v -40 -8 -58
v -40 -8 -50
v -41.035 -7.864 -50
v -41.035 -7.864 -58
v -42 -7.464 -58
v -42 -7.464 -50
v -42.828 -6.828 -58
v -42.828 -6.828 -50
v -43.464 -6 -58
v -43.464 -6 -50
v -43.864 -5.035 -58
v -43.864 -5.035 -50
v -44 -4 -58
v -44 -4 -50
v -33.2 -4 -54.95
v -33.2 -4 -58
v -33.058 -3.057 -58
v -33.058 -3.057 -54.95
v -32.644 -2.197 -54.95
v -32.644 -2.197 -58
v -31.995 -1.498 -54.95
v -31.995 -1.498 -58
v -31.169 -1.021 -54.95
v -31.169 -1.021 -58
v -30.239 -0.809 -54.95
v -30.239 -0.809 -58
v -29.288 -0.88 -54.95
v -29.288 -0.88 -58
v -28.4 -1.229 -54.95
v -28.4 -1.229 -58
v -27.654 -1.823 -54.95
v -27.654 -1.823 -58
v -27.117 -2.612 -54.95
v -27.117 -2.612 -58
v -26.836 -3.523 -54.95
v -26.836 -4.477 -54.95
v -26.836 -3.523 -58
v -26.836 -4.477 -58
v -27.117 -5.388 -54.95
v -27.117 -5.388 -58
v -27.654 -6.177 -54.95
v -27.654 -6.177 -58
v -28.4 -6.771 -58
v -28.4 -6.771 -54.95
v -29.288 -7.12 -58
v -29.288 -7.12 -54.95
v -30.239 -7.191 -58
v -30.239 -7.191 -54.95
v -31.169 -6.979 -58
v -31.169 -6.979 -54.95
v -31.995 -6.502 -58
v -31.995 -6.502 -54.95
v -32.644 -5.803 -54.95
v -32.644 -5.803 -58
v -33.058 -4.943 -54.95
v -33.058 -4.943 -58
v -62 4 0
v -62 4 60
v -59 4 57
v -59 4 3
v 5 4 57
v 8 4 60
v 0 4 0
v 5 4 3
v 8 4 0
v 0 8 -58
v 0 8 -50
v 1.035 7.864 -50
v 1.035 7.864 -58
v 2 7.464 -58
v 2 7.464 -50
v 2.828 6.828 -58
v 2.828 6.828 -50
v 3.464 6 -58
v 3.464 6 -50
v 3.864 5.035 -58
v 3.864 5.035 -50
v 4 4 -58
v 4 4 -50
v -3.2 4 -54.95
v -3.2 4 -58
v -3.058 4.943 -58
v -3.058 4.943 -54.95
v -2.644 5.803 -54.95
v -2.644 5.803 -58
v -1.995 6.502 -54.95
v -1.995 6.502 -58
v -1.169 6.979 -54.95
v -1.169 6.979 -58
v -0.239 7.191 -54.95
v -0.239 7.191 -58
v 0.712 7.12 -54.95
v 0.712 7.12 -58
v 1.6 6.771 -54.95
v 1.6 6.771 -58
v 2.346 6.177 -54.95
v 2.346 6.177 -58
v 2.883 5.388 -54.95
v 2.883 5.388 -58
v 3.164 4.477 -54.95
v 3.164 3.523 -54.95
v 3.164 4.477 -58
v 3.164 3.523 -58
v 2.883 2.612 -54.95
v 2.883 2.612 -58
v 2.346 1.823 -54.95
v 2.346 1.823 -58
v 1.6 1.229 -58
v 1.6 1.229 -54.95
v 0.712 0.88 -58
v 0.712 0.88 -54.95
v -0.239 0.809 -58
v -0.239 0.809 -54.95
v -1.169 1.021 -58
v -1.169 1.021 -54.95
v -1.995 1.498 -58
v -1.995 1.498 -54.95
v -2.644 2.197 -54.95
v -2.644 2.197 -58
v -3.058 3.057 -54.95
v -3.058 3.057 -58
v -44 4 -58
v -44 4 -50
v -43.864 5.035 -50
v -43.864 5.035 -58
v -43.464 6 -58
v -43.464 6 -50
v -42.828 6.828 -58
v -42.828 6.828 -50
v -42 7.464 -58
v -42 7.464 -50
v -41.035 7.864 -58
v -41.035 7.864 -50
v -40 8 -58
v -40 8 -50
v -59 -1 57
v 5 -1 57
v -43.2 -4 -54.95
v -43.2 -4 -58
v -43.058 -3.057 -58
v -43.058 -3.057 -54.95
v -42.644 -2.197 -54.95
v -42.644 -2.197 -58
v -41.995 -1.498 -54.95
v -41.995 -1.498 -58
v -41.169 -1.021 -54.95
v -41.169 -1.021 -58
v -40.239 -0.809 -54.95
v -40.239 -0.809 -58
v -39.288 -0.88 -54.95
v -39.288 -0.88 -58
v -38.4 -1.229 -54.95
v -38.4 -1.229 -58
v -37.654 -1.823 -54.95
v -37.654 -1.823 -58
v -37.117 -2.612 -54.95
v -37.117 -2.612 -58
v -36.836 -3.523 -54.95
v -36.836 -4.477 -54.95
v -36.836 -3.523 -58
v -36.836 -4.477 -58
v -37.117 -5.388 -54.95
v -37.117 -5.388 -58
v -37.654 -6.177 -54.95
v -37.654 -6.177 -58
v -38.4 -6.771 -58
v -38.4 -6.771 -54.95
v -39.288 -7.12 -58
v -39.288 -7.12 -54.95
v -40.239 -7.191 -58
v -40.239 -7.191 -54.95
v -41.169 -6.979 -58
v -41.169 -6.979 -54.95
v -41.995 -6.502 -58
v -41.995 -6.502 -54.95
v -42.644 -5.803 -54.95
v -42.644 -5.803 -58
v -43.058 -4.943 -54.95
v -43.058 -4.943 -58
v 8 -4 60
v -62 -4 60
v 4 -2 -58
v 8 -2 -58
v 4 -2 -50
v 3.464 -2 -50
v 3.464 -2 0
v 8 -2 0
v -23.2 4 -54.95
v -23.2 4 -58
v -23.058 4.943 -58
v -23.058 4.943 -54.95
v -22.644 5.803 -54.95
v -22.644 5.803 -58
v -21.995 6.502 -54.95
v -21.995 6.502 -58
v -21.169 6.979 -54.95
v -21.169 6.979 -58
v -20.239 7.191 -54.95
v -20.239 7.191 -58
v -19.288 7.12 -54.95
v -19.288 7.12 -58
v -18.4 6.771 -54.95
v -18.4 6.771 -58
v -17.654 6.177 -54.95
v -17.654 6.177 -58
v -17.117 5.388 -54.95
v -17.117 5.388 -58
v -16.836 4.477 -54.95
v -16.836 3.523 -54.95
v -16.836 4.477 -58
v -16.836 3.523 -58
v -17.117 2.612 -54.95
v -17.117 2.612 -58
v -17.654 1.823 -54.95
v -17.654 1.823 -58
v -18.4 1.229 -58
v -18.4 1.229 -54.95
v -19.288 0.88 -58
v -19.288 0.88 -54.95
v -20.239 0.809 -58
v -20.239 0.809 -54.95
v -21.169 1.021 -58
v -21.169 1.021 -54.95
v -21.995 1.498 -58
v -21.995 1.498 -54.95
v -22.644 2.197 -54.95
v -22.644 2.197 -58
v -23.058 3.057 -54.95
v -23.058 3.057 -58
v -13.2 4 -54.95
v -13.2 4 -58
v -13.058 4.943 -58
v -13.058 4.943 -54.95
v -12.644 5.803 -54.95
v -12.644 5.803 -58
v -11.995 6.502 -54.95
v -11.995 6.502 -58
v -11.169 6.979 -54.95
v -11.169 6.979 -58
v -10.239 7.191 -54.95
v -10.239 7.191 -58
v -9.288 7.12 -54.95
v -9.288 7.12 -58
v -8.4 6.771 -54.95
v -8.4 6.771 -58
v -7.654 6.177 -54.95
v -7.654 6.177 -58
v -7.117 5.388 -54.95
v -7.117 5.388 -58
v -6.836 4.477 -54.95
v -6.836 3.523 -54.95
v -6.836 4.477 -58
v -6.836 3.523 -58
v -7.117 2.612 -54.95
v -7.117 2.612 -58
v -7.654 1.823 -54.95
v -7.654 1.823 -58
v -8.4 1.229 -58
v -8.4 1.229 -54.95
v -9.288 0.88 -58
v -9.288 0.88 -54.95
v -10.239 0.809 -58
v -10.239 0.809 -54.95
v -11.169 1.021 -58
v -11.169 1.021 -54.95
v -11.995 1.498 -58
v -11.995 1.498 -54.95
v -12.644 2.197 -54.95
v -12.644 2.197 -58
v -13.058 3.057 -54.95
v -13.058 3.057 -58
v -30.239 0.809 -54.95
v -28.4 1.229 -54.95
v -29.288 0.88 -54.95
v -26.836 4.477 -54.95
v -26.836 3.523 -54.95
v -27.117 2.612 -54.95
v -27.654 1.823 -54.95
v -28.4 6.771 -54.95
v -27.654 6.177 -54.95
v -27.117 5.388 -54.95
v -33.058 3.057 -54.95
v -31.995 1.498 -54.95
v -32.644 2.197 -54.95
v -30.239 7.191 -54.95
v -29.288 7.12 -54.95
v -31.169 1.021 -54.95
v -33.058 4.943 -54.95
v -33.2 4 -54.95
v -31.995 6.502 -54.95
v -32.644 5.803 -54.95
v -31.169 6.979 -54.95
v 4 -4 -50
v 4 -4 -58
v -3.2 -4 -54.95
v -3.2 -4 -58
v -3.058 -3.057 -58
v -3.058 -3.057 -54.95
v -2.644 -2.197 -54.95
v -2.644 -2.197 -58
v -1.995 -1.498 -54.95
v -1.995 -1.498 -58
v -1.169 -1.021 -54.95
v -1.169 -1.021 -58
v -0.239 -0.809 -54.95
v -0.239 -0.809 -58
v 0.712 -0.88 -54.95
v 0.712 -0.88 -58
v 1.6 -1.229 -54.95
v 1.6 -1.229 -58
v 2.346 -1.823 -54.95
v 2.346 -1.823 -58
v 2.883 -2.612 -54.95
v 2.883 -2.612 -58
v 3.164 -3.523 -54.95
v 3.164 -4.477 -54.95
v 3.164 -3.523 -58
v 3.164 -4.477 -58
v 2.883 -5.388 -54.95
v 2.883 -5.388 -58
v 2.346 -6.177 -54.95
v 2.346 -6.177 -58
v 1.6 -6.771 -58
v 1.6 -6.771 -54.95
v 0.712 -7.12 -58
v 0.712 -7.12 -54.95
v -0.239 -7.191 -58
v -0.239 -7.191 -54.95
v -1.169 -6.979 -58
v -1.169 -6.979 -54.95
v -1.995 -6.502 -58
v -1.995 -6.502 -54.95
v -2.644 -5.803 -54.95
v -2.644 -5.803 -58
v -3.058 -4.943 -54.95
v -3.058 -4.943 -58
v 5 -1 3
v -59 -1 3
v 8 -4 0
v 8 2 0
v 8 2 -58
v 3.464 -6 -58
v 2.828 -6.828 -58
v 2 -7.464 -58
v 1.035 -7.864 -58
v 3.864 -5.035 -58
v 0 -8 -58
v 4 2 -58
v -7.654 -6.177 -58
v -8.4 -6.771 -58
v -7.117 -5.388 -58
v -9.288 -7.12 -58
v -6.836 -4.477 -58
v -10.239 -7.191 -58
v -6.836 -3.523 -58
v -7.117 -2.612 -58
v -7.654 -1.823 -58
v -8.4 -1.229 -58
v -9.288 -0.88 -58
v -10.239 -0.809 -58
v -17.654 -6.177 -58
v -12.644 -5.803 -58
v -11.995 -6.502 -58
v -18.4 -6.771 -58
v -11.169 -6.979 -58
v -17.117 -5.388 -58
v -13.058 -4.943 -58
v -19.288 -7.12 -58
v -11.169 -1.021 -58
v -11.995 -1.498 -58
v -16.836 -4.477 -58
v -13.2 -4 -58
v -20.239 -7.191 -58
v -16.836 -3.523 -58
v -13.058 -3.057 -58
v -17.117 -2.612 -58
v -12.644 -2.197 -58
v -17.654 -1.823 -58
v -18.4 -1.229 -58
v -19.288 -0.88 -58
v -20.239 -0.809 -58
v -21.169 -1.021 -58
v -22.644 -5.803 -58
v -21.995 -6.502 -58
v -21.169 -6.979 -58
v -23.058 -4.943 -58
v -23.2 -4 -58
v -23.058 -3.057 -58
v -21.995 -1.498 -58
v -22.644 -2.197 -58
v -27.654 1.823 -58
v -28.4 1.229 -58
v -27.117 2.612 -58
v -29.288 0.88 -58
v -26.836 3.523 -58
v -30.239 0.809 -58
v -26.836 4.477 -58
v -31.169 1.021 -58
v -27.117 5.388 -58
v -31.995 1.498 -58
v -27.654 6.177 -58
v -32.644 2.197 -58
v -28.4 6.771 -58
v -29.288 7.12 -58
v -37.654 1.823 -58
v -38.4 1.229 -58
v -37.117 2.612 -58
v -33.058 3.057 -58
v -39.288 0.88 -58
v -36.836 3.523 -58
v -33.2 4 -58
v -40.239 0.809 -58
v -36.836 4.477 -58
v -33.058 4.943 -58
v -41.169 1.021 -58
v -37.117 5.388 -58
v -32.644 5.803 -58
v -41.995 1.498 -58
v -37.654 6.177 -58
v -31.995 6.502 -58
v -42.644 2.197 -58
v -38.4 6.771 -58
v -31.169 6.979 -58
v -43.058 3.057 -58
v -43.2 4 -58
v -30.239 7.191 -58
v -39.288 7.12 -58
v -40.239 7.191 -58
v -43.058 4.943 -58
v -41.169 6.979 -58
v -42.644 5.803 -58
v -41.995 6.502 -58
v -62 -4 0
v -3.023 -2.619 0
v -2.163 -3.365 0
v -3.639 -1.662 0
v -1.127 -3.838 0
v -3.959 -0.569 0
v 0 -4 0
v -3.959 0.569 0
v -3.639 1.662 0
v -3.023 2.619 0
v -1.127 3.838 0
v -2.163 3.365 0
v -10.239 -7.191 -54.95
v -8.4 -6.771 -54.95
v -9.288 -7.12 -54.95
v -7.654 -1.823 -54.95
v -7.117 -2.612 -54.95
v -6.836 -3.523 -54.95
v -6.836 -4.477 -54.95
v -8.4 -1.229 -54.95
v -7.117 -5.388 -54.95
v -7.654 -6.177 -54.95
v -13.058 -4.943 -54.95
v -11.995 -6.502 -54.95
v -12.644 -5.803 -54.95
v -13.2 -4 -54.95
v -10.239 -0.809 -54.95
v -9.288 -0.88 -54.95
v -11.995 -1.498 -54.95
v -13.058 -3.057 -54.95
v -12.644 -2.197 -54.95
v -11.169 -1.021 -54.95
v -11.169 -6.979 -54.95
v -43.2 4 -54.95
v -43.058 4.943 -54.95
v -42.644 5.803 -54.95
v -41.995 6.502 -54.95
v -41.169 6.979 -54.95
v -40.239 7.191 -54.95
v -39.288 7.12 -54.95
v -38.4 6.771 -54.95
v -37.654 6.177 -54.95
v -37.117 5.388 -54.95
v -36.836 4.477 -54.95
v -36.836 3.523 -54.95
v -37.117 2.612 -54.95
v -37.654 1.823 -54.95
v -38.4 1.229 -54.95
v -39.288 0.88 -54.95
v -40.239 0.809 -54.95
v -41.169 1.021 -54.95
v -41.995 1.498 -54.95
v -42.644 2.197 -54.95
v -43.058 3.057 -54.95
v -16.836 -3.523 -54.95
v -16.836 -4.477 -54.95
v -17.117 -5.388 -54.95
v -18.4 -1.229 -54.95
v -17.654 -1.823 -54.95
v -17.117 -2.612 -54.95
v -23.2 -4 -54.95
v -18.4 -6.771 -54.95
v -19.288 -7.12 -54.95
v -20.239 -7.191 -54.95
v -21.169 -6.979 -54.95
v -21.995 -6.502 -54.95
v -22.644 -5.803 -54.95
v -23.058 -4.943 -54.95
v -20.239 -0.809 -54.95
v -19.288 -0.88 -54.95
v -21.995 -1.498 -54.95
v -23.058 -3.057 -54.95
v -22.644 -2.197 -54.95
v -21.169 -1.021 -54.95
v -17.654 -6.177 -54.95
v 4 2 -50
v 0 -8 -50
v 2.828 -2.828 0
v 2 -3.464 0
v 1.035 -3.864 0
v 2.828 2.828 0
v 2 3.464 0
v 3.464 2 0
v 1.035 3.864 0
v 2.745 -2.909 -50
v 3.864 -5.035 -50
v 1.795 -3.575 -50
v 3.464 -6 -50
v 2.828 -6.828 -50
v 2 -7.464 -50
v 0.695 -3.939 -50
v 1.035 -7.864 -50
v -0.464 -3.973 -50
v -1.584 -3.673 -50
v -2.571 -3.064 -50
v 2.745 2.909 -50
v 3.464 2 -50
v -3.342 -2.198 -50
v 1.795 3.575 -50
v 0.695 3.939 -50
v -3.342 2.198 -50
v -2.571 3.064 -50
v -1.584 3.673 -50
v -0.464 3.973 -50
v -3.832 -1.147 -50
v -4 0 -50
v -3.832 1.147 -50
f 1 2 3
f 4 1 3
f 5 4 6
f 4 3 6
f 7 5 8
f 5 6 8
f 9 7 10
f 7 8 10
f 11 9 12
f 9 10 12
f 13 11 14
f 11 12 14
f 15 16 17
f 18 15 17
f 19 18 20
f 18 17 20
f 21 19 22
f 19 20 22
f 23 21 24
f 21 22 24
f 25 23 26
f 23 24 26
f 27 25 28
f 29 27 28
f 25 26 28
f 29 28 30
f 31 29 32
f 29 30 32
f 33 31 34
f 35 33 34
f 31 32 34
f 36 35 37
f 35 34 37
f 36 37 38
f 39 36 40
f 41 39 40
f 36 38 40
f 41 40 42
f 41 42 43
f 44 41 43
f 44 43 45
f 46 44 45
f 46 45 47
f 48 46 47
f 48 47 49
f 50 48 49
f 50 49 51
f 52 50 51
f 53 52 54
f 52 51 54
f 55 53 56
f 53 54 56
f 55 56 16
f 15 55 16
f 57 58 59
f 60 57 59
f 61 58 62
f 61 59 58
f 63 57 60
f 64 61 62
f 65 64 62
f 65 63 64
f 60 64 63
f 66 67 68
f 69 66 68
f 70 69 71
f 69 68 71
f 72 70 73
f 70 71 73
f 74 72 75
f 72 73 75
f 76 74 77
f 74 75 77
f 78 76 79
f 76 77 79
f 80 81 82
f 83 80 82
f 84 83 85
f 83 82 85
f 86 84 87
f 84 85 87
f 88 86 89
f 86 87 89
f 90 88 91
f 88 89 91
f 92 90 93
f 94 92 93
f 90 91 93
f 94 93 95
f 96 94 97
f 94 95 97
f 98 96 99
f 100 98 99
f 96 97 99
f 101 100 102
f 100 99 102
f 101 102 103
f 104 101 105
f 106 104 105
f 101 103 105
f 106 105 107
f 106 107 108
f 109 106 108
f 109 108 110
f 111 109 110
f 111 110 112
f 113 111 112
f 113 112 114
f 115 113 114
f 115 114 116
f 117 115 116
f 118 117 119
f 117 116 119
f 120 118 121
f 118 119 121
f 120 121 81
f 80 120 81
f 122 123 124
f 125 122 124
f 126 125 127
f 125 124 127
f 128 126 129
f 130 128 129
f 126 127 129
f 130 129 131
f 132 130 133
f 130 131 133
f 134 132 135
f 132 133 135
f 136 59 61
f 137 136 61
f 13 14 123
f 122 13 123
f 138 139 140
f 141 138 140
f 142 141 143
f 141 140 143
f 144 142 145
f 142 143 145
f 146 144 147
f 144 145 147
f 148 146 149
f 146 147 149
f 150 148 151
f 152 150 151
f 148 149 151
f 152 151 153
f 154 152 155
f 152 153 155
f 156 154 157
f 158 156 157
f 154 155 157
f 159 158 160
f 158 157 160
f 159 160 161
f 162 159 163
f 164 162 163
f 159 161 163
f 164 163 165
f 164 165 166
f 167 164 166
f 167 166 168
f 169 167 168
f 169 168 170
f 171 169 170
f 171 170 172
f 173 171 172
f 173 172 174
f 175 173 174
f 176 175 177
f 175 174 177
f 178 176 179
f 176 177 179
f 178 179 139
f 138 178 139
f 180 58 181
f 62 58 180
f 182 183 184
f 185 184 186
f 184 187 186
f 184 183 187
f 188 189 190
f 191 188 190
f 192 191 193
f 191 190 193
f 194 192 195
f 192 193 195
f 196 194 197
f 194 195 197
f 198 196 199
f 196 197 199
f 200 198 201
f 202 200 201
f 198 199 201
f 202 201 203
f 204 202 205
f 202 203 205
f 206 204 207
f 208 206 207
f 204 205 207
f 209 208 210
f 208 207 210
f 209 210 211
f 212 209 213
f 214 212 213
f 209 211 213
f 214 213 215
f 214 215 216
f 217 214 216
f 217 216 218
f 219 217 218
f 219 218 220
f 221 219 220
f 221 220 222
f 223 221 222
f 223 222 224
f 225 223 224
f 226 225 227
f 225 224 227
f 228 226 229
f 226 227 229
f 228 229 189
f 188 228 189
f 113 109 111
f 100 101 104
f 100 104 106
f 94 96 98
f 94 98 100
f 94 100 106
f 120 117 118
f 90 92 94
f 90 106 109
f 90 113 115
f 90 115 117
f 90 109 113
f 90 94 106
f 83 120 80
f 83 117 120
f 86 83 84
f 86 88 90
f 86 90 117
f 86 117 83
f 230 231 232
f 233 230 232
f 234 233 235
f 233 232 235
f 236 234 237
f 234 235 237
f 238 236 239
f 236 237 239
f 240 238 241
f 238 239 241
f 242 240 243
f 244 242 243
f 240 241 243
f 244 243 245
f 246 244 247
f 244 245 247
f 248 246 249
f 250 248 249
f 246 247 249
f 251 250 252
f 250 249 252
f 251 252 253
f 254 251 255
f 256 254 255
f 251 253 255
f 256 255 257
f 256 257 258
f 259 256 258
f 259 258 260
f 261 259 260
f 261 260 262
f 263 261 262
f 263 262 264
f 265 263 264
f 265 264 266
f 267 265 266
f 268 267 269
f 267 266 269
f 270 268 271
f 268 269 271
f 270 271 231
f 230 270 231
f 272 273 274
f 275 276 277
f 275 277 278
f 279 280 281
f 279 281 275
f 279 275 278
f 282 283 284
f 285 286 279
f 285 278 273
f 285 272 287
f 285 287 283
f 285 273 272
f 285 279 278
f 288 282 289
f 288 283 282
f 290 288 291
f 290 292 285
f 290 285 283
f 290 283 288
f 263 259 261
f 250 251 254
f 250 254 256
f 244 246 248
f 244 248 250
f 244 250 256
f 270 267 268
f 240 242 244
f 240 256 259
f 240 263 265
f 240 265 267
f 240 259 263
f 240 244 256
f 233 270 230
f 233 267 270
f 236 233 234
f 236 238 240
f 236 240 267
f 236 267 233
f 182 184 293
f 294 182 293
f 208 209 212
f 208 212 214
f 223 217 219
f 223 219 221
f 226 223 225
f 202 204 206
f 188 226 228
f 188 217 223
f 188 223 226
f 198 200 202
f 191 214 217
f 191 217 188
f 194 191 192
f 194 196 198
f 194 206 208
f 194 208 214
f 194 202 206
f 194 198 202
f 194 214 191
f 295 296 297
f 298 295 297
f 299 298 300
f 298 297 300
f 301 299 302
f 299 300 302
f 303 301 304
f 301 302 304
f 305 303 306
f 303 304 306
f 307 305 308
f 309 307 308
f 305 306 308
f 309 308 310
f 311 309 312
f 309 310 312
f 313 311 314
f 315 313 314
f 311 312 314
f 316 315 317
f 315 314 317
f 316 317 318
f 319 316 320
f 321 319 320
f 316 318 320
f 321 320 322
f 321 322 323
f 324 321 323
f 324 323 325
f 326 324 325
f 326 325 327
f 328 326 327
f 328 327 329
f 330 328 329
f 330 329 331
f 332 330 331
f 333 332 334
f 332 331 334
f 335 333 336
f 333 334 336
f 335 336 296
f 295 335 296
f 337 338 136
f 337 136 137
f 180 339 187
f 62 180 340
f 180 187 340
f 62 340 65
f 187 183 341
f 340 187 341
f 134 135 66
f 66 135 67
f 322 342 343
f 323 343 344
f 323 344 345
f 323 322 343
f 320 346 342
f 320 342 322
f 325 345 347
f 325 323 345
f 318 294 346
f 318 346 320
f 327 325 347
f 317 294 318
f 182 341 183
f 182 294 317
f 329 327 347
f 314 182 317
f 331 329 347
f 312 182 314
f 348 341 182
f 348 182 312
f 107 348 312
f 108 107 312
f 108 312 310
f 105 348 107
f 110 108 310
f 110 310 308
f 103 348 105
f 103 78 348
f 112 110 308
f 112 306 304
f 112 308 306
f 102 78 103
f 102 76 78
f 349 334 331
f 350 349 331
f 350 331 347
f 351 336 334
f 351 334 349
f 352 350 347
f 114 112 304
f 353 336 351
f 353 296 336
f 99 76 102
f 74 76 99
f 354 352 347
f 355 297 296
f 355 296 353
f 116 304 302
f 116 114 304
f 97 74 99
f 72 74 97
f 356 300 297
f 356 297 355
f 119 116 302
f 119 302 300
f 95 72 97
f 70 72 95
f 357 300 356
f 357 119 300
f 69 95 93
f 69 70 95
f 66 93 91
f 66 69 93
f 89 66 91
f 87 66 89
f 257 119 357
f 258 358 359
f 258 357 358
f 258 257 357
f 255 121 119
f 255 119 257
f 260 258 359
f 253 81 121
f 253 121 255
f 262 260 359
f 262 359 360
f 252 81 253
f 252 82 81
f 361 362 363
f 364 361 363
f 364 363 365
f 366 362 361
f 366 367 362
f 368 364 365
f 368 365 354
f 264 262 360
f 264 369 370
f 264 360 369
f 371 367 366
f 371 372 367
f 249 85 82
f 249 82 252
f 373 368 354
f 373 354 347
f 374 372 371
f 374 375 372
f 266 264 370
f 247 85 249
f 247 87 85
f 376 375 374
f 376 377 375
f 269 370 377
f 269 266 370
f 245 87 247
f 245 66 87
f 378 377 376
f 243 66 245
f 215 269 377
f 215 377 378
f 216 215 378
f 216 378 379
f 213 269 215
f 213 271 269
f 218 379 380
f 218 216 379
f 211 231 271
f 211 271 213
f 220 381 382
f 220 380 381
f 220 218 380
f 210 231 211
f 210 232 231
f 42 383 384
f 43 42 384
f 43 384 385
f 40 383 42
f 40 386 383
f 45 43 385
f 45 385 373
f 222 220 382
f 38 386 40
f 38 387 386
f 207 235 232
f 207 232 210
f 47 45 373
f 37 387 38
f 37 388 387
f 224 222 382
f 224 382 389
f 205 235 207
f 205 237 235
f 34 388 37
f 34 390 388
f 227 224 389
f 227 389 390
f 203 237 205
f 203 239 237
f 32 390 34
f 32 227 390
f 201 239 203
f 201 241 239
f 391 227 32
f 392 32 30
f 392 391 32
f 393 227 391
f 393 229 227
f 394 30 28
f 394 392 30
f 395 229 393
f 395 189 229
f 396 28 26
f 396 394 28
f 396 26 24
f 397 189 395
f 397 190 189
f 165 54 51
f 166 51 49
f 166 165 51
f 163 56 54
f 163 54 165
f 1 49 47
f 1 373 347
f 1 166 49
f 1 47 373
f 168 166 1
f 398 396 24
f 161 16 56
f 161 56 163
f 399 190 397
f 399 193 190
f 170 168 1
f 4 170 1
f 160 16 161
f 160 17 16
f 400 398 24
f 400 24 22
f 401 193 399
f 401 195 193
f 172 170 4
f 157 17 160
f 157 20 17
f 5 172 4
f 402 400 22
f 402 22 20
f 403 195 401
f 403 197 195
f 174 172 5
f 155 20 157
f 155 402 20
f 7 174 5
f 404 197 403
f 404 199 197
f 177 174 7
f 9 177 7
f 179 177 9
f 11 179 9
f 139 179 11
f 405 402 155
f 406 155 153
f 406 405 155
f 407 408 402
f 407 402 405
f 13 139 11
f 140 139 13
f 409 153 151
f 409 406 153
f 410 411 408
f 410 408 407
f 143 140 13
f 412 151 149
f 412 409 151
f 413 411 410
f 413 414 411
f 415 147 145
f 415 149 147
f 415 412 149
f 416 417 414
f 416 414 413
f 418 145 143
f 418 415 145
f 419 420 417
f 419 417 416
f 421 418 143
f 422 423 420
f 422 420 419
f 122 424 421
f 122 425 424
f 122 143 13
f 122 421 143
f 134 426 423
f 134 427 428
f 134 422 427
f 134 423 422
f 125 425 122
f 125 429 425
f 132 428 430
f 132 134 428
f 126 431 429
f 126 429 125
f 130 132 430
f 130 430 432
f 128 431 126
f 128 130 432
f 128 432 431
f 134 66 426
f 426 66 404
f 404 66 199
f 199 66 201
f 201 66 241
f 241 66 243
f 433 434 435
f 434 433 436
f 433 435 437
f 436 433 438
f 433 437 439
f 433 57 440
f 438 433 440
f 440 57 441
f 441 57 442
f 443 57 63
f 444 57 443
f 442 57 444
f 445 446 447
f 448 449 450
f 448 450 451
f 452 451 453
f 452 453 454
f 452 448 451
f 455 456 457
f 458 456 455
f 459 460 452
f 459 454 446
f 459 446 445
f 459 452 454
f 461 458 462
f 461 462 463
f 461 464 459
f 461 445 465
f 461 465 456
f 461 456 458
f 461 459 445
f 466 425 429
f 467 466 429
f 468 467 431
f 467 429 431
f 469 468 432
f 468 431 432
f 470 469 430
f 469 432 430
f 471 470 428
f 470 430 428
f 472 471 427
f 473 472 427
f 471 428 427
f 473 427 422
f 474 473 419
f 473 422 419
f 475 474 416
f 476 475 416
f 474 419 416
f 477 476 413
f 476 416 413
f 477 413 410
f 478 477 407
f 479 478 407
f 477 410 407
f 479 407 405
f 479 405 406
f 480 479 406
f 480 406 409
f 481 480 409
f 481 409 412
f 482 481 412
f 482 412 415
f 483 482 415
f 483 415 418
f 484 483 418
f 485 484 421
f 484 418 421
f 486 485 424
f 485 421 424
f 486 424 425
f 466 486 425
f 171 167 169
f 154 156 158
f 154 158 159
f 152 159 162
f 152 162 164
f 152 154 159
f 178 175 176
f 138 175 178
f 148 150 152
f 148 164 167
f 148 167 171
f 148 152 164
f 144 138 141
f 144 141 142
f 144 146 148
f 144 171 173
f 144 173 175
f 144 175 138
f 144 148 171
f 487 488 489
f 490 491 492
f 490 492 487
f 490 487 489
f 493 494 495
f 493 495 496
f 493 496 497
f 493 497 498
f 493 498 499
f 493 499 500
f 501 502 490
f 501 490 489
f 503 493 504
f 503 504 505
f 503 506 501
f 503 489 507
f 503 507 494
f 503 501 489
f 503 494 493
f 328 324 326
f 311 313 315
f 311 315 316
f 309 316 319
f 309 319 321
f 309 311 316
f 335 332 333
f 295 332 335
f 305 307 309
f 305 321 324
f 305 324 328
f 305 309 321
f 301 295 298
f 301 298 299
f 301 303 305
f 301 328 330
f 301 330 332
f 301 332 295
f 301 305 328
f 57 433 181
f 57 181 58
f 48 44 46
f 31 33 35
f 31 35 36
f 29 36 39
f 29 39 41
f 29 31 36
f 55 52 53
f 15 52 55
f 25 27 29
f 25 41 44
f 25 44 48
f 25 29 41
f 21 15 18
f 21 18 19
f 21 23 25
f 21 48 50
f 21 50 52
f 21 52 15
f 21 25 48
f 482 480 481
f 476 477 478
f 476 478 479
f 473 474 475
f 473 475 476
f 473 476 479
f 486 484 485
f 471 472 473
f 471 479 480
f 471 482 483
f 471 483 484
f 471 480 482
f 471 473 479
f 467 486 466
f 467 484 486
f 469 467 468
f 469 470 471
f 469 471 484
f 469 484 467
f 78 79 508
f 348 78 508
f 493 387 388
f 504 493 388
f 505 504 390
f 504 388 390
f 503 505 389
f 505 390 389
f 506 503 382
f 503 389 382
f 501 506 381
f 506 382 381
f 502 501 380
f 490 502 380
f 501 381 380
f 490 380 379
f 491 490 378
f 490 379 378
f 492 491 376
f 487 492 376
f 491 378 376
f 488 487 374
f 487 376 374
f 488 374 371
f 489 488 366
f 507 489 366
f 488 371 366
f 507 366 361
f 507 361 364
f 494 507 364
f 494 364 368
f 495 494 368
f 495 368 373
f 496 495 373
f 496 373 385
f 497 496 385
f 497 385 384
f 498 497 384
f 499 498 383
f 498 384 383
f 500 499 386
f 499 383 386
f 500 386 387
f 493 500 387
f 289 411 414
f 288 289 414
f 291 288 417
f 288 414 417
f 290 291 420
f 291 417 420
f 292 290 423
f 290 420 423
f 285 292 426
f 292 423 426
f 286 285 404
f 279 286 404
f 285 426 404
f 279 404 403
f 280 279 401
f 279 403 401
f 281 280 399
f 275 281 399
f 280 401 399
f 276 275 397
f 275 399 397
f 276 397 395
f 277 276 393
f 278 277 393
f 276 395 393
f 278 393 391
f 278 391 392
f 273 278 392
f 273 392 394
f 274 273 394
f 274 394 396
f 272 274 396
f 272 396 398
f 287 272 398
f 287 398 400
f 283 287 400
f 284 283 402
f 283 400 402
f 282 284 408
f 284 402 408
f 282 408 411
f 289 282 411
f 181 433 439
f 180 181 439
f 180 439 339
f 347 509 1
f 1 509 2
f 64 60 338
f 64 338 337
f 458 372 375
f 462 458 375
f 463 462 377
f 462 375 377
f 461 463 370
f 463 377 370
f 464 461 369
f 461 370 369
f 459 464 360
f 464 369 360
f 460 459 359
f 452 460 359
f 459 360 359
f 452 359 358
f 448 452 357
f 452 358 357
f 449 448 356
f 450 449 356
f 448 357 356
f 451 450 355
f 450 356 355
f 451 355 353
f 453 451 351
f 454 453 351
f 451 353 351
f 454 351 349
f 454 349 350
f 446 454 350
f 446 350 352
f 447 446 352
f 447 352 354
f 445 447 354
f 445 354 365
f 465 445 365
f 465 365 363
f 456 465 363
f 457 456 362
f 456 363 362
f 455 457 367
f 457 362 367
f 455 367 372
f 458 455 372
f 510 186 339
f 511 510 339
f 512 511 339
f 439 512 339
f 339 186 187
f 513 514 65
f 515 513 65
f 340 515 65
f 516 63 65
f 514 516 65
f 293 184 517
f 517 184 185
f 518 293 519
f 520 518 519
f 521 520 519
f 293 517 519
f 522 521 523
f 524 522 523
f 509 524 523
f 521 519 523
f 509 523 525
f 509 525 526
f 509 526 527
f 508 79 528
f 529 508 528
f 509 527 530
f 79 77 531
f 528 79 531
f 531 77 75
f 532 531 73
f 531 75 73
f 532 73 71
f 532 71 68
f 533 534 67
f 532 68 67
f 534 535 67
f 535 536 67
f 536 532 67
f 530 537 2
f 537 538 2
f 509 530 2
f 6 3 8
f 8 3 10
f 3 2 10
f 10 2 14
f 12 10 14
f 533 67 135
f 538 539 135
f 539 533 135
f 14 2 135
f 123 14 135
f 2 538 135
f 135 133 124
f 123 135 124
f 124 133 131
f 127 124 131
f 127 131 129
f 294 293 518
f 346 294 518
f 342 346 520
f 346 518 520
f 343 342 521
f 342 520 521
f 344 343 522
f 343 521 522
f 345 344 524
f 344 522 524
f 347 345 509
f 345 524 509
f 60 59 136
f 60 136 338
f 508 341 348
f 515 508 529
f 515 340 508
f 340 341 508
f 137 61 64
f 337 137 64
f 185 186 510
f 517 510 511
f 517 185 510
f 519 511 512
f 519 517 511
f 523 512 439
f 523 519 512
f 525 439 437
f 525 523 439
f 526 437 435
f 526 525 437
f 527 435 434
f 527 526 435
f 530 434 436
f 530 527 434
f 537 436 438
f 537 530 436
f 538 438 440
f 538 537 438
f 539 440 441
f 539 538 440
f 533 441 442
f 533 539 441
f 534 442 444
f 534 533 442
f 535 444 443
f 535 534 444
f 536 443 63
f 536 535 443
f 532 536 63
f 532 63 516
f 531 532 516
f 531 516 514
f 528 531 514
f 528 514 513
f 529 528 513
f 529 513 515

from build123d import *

# Parameters (mm, degrees)
EXTRUDE_1_DEPTH      = 5
EXTRUDE_1_DEPTH_BACK = 50
SKETCH_13_R          = 8.470611641
CUT_EXTRUDE_6_DEPTH  = 5
EXTRUDE_7_DEPTH      = 8
SKETCH_27_W          = 4
SKETCH_27_H          = 4
EXTRUDE_9_DEPTH      = 8
SKETCH_24_R          = 3.2
CUT_EXTRUDE_9_DEPTH  = 3.05
SKETCH_21_W          = 70
SKETCH_21_H          = 8
EXTRUDE_6_DEPTH      = 60
SKETCH_22_W          = 64
SKETCH_22_H          = 54
CUT_EXTRUDE_8_DEPTH  = 5


with BuildPart() as part:
    # ｽｹｯﾁ1 → ﾎﾞｽ - 押し出し1 (new, two sides: drawn at the far end of the back side and taken through both)
    with BuildSketch(Plane.XY.offset(-EXTRUDE_1_DEPTH_BACK)):
        with BuildLine():
            Line((3.464101615, 2), (8, 2))
            Line((8, 2), (8, -2))
            Line((8, -2), (3.464101615, -2))
            ThreePointArc((3.464101615, -2), (-4, 0), (3.464101615, 2))
        make_face()
    extrude(amount=EXTRUDE_1_DEPTH + EXTRUDE_1_DEPTH_BACK)

    # ｽｹｯﾁ13 → ｶｯﾄ - 押し出し6 (cut)
    with BuildSketch(Plane.XY.offset(5)):
        Circle(SKETCH_13_R)
    extrude(amount=-CUT_EXTRUDE_6_DEPTH, mode=Mode.SUBTRACT)

    # ｽｹｯﾁ23 → ﾎﾞｽ - 押し出し7 (add)
    with BuildSketch(Plane(origin=(0, 0, -50), x_dir=(-1, 0, 0), z_dir=(0, 0, -1))):
        with BuildLine():
            Line((-4, 4), (-4, -4))
            ThreePointArc((-4, -4), (-2.828427125, -6.828427125), (0, -8))
            Line((0, -8), (40, -8))
            ThreePointArc((40, -8), (42.828427125, -6.828427125), (44, -4))
            Line((44, -4), (44, 4))
            ThreePointArc((44, 4), (42.828427125, 6.828427125), (40, 8))
            Line((40, 8), (0, 8))
            ThreePointArc((0, 8), (-2.828427125, 6.828427125), (-4, 4))
        make_face()
    extrude(amount=EXTRUDE_7_DEPTH)

    # ｽｹｯﾁ27 → ﾎﾞｽ - 押し出し9 (add)
    with BuildSketch(Plane(origin=(0, 0, -50), x_dir=(-1, 0, 0), z_dir=(0, 0, -1))):
        with Locations((-6, 0)):
            Rectangle(SKETCH_27_W, SKETCH_27_H)
    extrude(amount=EXTRUDE_9_DEPTH)

    # ｽｹｯﾁ24 → ｶｯﾄ - 押し出し9 (cut)
    with BuildSketch(Plane(origin=(0, 0, -58), x_dir=(-1, 0, 0), z_dir=(0, 0, -1))):
        with Locations((0, 4)):
            Circle(SKETCH_24_R)
        with Locations((40, 4)):
            Circle(SKETCH_24_R)
        with Locations((40, -4)):
            Circle(SKETCH_24_R)
        with Locations((0, -4)):
            Circle(SKETCH_24_R)
        with Locations((10, 4)):
            Circle(SKETCH_24_R)
        with Locations((20, 4)):
            Circle(SKETCH_24_R)
        with Locations((30, 4)):
            Circle(SKETCH_24_R)
        with Locations((10, -4)):
            Circle(SKETCH_24_R)
        with Locations((20, -4)):
            Circle(SKETCH_24_R)
        with Locations((30, -4)):
            Circle(SKETCH_24_R)
    extrude(amount=-CUT_EXTRUDE_9_DEPTH, mode=Mode.SUBTRACT)

    # ｽｹｯﾁ21 → ﾎﾞｽ - 押し出し6 (add)
    with BuildSketch(Plane.XY):
        with Locations((-27, 0)):
            Rectangle(SKETCH_21_W, SKETCH_21_H)
    extrude(amount=EXTRUDE_6_DEPTH)

    # ｽｹｯﾁ22 → ｶｯﾄ - 押し出し8 (cut)
    with BuildSketch(Plane(origin=(0, 4, 0), x_dir=(1, 0, 0), z_dir=(0, 1, 0))):
        with Locations((-27, -30)):
            Rectangle(SKETCH_22_W, SKETCH_22_H)
    extrude(amount=-CUT_EXTRUDE_8_DEPTH, mode=Mode.SUBTRACT)


solid = part.part
